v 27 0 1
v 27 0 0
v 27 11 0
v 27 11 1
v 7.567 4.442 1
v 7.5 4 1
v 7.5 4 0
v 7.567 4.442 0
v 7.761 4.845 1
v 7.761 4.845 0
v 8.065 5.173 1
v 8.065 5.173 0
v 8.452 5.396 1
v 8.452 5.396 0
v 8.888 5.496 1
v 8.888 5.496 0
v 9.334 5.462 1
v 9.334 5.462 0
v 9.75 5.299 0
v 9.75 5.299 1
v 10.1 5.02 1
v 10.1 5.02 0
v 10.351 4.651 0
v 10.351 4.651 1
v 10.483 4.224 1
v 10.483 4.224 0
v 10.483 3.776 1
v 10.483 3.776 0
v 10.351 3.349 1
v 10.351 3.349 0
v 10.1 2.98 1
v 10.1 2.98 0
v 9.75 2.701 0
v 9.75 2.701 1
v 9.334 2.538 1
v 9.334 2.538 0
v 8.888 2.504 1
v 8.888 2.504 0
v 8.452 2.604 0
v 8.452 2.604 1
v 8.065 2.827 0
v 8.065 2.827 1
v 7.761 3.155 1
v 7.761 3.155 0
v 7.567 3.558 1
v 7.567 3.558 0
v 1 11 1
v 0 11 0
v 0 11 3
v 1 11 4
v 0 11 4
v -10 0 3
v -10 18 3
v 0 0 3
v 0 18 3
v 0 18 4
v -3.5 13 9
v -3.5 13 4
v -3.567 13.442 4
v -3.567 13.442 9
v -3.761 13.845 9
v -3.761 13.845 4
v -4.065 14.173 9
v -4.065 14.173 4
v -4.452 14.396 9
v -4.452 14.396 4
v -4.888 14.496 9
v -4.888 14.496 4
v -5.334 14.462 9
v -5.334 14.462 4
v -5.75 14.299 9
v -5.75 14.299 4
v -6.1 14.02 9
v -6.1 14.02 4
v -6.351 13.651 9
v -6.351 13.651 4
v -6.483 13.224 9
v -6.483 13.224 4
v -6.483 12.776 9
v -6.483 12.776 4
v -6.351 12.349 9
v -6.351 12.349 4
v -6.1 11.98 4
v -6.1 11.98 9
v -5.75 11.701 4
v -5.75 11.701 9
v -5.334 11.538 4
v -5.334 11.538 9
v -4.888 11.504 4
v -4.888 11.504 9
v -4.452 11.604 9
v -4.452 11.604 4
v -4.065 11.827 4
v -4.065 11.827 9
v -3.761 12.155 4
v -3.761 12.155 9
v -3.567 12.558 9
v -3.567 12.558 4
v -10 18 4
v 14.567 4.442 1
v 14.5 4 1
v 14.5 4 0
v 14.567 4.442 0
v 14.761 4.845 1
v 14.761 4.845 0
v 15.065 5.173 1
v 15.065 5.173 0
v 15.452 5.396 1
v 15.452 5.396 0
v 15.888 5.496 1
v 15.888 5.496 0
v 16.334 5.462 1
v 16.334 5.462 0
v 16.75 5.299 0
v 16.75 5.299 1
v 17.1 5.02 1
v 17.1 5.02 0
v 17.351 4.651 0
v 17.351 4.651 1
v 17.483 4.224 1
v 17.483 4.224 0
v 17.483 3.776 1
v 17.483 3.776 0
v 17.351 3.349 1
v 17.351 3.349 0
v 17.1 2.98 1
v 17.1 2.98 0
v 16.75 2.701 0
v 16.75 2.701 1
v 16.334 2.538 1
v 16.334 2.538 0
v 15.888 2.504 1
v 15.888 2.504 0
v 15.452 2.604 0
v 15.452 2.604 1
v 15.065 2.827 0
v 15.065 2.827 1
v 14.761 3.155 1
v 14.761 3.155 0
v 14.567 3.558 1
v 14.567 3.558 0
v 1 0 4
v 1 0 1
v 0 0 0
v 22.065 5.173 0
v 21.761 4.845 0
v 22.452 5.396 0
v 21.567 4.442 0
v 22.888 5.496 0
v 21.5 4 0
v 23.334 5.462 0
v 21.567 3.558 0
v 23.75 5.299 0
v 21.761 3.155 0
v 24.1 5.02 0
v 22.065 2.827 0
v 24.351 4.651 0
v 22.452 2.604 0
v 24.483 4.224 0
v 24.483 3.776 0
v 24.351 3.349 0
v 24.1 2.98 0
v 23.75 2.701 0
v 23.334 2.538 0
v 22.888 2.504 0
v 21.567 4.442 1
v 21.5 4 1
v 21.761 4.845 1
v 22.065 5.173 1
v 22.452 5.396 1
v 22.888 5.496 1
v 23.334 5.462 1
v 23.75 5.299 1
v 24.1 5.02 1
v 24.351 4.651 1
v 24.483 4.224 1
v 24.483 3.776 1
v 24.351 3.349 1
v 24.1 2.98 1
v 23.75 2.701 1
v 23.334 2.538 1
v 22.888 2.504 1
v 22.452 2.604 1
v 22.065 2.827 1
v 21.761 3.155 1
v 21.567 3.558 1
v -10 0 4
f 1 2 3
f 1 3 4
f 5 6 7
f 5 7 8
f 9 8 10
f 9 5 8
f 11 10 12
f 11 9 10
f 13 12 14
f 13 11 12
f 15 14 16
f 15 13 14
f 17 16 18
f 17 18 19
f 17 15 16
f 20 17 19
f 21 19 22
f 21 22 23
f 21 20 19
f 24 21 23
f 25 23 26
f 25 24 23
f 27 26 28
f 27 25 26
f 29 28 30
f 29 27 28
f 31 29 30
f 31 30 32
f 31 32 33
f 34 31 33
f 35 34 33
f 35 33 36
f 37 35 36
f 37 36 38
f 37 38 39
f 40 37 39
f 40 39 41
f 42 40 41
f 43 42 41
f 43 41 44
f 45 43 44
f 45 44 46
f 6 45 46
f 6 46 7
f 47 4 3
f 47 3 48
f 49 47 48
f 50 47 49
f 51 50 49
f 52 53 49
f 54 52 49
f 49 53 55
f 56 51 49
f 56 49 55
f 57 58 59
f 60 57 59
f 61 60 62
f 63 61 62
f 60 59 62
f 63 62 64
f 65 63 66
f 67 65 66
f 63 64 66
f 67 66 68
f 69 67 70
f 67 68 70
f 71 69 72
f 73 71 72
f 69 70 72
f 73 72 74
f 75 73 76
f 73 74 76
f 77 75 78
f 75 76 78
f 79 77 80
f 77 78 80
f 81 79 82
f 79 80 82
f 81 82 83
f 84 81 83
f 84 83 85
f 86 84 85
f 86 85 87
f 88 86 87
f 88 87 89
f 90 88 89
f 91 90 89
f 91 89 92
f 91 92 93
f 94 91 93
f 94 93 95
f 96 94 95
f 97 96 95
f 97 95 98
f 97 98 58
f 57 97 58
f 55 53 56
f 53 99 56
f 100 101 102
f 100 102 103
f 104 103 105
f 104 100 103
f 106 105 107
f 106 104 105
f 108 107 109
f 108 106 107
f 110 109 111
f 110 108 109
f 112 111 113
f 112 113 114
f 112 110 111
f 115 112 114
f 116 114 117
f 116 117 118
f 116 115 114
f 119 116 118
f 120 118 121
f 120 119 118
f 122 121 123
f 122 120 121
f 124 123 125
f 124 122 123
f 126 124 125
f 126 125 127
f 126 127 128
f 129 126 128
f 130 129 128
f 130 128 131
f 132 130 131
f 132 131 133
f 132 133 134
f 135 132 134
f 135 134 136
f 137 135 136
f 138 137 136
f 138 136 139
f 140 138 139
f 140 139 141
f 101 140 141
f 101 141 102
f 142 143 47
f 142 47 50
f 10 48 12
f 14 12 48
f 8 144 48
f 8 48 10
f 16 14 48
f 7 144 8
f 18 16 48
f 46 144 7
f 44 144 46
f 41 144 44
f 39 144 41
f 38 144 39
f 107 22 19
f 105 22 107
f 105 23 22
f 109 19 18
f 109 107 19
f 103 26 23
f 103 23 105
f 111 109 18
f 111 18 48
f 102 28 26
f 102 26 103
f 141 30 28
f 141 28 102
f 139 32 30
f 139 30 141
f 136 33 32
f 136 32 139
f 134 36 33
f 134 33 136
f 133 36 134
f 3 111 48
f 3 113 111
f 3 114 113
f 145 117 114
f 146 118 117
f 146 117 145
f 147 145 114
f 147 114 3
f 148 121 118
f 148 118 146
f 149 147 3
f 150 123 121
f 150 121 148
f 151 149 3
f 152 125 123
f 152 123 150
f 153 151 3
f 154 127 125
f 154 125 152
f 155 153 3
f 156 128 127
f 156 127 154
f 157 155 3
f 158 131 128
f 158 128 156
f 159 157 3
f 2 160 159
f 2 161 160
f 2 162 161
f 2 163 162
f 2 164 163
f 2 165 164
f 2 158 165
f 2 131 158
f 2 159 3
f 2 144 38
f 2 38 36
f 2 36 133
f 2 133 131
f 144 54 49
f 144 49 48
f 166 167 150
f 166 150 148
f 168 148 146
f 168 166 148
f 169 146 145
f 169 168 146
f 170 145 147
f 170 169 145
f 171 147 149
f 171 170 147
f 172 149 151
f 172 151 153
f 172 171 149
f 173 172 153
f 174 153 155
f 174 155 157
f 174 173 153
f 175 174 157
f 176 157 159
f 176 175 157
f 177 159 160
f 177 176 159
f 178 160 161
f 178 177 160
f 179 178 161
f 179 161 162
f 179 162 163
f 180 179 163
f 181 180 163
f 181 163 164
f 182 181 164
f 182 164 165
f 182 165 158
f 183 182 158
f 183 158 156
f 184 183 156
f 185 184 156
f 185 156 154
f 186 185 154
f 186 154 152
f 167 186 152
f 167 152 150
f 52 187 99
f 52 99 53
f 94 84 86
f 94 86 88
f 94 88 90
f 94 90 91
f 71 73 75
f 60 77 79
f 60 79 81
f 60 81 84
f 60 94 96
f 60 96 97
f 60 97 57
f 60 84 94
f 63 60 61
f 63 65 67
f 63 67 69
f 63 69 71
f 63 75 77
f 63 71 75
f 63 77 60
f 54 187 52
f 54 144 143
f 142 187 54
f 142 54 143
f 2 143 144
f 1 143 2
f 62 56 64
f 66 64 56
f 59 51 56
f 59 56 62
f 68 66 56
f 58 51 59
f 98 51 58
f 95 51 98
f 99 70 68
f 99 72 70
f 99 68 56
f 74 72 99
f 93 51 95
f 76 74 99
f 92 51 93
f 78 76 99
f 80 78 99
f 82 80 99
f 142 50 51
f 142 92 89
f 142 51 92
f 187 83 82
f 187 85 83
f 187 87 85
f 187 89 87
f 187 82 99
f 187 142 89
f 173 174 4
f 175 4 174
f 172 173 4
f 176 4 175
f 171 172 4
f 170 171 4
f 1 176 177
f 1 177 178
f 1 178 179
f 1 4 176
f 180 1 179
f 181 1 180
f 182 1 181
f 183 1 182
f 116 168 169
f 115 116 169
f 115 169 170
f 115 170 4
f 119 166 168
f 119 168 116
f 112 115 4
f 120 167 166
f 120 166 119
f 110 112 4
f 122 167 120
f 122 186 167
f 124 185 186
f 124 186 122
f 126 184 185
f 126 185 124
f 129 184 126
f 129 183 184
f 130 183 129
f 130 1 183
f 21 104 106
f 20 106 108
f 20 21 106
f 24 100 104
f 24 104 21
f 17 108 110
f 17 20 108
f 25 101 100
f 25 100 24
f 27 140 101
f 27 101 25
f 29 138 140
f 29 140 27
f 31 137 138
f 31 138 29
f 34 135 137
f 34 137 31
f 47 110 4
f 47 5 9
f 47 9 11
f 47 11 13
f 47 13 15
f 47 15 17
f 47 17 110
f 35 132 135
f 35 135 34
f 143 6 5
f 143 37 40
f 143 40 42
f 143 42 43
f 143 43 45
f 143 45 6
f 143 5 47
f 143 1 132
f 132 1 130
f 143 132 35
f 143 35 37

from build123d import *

# Parameters (mm, degrees)
PAD_DEPTH       = 18
SKETCH001_W     = 27
SKETCH001_H     = 7
POCKET_DEPTH    = 10
SKETCH002_W     = 1
SKETCH002_H     = 7
POCKET001_DEPTH = 4.001
SKETCH003_R     = 1.5
POCKET002_DEPTH = 1.001
SKETCH004_R     = 1.5
PAD001_DEPTH    = 6


with BuildPart() as body:
    # Sketch → Pad (new body)
    with BuildSketch(Plane.XZ):
        Polygon((0, 0), (27, 0), (27, 1), (1, 1), (1, 4), (-10, 4), (-10, 3), (0, 3), align=None)
    extrude(amount=PAD_DEPTH)

    # Sketch001 (on Face3 of Pad) → Pocket (cut)
    with BuildSketch(Plane(origin=(0, 0, 1), x_dir=(-1, 0, 0), z_dir=(0, 0, 1))):
        with Locations((-13.5, 14.5)):
            Rectangle(SKETCH001_W, SKETCH001_H)
    extrude(amount=-POCKET_DEPTH, mode=Mode.SUBTRACT)

    # Sketch002 (on Face8 of Pocket) → Pocket001 (cut, through all)
    with BuildSketch(Plane(origin=(0, 0, 4), x_dir=(-1, 0, 0), z_dir=(0, 0, 1))):
        with Locations((-0.5, 14.5)):
            Rectangle(SKETCH002_W, SKETCH002_H)
    extrude(amount=-POCKET001_DEPTH, mode=Mode.SUBTRACT)

    # Sketch003 (on Face7 of Pocket001) → Pocket002 (cut, through all)
    with BuildSketch(Plane(origin=(0, 0, 1), x_dir=(-1, 0, 0), z_dir=(0, 0, 1))):
        with Locations((-23, 4)):
            Circle(SKETCH003_R)
        with Locations((-16, 4)):
            Circle(SKETCH003_R)
        with Locations((-9, 4)):
            Circle(SKETCH003_R)
    extrude(amount=-POCKET002_DEPTH, mode=Mode.SUBTRACT)

    # Sketch004 (on Face14 of Pocket002) → Pad001 (join)
    with BuildSketch(Plane(origin=(0, 0, 3), x_dir=(1, 0, 0), z_dir=(0, 0, -1))):
        with Locations((-5, 13)):
            Circle(SKETCH004_R)
    extrude(amount=-PAD001_DEPTH)


with BuildPart() as part_mirroring:
    # Part__Mirroring: instance of Body
    add(body.part.mirror(Plane(origin=(0, 0, 0), x_dir=(1, 0, 0), z_dir=(0, 1, 0))))


solid = part_mirroring.part
